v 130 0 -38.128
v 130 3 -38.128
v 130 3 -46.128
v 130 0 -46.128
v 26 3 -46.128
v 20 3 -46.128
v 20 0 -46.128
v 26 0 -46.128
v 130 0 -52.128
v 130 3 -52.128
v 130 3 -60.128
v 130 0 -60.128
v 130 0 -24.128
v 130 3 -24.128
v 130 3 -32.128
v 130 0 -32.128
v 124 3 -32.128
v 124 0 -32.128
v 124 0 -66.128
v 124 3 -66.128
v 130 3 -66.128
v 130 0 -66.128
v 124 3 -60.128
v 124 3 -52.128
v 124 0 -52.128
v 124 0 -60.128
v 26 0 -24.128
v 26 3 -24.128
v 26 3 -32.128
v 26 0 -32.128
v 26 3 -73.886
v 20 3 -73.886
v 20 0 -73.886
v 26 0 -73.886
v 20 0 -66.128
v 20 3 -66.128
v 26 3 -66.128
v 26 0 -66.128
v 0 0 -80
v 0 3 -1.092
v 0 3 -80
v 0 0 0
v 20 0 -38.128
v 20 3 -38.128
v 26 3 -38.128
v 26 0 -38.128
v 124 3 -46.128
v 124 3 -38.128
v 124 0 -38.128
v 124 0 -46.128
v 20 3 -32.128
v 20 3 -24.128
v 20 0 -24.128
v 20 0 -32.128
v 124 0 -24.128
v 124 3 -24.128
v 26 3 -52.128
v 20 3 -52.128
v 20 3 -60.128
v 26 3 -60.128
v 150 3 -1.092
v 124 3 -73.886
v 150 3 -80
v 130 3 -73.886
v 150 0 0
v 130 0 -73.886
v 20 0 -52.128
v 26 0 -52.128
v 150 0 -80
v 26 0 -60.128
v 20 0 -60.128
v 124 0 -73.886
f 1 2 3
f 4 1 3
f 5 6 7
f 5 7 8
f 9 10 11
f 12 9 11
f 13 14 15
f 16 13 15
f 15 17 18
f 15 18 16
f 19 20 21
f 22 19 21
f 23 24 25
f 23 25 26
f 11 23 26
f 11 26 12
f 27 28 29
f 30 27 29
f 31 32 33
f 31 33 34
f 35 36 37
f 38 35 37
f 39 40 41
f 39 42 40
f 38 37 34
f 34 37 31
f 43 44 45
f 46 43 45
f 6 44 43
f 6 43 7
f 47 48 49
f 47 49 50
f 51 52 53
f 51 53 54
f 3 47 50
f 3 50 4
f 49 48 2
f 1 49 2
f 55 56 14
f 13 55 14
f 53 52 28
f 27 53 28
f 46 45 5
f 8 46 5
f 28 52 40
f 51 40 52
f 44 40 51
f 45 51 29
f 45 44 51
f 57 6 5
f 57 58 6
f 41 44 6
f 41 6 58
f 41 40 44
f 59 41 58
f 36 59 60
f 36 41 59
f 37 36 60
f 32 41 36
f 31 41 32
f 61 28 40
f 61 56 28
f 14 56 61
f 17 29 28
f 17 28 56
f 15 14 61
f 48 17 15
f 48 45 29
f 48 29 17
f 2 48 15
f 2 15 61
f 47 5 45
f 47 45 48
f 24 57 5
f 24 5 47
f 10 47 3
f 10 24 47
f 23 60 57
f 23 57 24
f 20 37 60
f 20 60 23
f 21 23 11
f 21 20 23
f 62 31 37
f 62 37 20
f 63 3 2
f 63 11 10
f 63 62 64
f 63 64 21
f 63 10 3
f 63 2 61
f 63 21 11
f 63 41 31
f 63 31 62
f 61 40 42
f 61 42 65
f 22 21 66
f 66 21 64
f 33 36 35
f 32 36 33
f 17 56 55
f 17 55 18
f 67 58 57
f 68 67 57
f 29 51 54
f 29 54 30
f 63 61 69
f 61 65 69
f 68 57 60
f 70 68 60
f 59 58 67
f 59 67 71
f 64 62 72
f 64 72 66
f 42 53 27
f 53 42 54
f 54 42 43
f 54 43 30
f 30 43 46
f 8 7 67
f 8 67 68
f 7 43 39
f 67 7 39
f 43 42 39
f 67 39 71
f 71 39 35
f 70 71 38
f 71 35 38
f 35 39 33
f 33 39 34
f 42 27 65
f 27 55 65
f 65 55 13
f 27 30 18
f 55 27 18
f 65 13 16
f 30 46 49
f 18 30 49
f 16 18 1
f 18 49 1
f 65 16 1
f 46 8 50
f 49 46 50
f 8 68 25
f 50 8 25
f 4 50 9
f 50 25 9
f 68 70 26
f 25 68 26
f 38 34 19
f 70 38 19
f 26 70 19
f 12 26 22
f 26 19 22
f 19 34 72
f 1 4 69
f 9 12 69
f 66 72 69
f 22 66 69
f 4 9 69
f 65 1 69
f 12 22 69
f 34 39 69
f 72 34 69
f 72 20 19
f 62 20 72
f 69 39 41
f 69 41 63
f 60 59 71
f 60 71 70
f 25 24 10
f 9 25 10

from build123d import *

# Parameters (mm, degrees)
ESQUISSE1_W             = 150
ESQUISSE1_H             = 80
BOSS_EXTRU_1_DEPTH      = 3
CHANFREIN2_SIZE2        = 1.091910703
CHANFREIN2_SIZE         = 3
ESQUISSE2_W             = 6
ESQUISSE2_H             = 7.757567742
ESQUISSE2_H_2           = 8
ENL_V_MAT_EXTRU_1_DEPTH = 3


with BuildPart() as part:
    # Esquisse1 → Boss.-Extru.1 (new body)
    with BuildSketch(Plane(origin=(0, 0, 0), x_dir=(1, 0, 0), z_dir=(0, 1, 0))):
        with Locations((75, 40)):
            Rectangle(ESQUISSE1_W, ESQUISSE1_H)
    extrude(amount=BOSS_EXTRU_1_DEPTH)

    # Chanfrein2
    chanfrein2_edges = [part.edges().sort_by_distance(p)[0] for p in [
        (75, 3, 0),
    ]]
    chanfrein2_side = [part.faces().sort_by_distance(p)[0] for p in [
        (75, 2.978161786, 0),
    ]]
    chamfer(chanfrein2_edges, length=CHANFREIN2_SIZE - 0.0001, length2=CHANFREIN2_SIZE2 - 0.0001, reference=chanfrein2_side[0])  # a hair under: the kernel refuses the full size

    # Esquisse2 → Enlèv. mat.-Extru.1 (cut)
    with BuildSketch(Plane(origin=(0, 3, 0), x_dir=(1, 0, 0), z_dir=(0, 1, 0))):
        with Locations((127, 70.007139416)):
            Rectangle(ESQUISSE2_W, ESQUISSE2_H)
        with Locations((127, 56.128355545)):
            Rectangle(ESQUISSE2_W, ESQUISSE2_H_2)
        with Locations((127, 42.128355545)):
            Rectangle(ESQUISSE2_W, ESQUISSE2_H_2)
        with Locations((127, 28.128355545)):
            Rectangle(ESQUISSE2_W, ESQUISSE2_H_2)
        with Locations((23, 28.128355545)):
            Rectangle(ESQUISSE2_W, ESQUISSE2_H_2)
        with Locations((23, 42.128355545)):
            Rectangle(ESQUISSE2_W, ESQUISSE2_H_2)
        with Locations((23, 56.128355545)):
            Rectangle(ESQUISSE2_W, ESQUISSE2_H_2)
        with Locations((23, 70.007139416)):
            Rectangle(ESQUISSE2_W, ESQUISSE2_H)
    extrude(amount=-ENL_V_MAT_EXTRU_1_DEPTH, mode=Mode.SUBTRACT)


solid = part.part
